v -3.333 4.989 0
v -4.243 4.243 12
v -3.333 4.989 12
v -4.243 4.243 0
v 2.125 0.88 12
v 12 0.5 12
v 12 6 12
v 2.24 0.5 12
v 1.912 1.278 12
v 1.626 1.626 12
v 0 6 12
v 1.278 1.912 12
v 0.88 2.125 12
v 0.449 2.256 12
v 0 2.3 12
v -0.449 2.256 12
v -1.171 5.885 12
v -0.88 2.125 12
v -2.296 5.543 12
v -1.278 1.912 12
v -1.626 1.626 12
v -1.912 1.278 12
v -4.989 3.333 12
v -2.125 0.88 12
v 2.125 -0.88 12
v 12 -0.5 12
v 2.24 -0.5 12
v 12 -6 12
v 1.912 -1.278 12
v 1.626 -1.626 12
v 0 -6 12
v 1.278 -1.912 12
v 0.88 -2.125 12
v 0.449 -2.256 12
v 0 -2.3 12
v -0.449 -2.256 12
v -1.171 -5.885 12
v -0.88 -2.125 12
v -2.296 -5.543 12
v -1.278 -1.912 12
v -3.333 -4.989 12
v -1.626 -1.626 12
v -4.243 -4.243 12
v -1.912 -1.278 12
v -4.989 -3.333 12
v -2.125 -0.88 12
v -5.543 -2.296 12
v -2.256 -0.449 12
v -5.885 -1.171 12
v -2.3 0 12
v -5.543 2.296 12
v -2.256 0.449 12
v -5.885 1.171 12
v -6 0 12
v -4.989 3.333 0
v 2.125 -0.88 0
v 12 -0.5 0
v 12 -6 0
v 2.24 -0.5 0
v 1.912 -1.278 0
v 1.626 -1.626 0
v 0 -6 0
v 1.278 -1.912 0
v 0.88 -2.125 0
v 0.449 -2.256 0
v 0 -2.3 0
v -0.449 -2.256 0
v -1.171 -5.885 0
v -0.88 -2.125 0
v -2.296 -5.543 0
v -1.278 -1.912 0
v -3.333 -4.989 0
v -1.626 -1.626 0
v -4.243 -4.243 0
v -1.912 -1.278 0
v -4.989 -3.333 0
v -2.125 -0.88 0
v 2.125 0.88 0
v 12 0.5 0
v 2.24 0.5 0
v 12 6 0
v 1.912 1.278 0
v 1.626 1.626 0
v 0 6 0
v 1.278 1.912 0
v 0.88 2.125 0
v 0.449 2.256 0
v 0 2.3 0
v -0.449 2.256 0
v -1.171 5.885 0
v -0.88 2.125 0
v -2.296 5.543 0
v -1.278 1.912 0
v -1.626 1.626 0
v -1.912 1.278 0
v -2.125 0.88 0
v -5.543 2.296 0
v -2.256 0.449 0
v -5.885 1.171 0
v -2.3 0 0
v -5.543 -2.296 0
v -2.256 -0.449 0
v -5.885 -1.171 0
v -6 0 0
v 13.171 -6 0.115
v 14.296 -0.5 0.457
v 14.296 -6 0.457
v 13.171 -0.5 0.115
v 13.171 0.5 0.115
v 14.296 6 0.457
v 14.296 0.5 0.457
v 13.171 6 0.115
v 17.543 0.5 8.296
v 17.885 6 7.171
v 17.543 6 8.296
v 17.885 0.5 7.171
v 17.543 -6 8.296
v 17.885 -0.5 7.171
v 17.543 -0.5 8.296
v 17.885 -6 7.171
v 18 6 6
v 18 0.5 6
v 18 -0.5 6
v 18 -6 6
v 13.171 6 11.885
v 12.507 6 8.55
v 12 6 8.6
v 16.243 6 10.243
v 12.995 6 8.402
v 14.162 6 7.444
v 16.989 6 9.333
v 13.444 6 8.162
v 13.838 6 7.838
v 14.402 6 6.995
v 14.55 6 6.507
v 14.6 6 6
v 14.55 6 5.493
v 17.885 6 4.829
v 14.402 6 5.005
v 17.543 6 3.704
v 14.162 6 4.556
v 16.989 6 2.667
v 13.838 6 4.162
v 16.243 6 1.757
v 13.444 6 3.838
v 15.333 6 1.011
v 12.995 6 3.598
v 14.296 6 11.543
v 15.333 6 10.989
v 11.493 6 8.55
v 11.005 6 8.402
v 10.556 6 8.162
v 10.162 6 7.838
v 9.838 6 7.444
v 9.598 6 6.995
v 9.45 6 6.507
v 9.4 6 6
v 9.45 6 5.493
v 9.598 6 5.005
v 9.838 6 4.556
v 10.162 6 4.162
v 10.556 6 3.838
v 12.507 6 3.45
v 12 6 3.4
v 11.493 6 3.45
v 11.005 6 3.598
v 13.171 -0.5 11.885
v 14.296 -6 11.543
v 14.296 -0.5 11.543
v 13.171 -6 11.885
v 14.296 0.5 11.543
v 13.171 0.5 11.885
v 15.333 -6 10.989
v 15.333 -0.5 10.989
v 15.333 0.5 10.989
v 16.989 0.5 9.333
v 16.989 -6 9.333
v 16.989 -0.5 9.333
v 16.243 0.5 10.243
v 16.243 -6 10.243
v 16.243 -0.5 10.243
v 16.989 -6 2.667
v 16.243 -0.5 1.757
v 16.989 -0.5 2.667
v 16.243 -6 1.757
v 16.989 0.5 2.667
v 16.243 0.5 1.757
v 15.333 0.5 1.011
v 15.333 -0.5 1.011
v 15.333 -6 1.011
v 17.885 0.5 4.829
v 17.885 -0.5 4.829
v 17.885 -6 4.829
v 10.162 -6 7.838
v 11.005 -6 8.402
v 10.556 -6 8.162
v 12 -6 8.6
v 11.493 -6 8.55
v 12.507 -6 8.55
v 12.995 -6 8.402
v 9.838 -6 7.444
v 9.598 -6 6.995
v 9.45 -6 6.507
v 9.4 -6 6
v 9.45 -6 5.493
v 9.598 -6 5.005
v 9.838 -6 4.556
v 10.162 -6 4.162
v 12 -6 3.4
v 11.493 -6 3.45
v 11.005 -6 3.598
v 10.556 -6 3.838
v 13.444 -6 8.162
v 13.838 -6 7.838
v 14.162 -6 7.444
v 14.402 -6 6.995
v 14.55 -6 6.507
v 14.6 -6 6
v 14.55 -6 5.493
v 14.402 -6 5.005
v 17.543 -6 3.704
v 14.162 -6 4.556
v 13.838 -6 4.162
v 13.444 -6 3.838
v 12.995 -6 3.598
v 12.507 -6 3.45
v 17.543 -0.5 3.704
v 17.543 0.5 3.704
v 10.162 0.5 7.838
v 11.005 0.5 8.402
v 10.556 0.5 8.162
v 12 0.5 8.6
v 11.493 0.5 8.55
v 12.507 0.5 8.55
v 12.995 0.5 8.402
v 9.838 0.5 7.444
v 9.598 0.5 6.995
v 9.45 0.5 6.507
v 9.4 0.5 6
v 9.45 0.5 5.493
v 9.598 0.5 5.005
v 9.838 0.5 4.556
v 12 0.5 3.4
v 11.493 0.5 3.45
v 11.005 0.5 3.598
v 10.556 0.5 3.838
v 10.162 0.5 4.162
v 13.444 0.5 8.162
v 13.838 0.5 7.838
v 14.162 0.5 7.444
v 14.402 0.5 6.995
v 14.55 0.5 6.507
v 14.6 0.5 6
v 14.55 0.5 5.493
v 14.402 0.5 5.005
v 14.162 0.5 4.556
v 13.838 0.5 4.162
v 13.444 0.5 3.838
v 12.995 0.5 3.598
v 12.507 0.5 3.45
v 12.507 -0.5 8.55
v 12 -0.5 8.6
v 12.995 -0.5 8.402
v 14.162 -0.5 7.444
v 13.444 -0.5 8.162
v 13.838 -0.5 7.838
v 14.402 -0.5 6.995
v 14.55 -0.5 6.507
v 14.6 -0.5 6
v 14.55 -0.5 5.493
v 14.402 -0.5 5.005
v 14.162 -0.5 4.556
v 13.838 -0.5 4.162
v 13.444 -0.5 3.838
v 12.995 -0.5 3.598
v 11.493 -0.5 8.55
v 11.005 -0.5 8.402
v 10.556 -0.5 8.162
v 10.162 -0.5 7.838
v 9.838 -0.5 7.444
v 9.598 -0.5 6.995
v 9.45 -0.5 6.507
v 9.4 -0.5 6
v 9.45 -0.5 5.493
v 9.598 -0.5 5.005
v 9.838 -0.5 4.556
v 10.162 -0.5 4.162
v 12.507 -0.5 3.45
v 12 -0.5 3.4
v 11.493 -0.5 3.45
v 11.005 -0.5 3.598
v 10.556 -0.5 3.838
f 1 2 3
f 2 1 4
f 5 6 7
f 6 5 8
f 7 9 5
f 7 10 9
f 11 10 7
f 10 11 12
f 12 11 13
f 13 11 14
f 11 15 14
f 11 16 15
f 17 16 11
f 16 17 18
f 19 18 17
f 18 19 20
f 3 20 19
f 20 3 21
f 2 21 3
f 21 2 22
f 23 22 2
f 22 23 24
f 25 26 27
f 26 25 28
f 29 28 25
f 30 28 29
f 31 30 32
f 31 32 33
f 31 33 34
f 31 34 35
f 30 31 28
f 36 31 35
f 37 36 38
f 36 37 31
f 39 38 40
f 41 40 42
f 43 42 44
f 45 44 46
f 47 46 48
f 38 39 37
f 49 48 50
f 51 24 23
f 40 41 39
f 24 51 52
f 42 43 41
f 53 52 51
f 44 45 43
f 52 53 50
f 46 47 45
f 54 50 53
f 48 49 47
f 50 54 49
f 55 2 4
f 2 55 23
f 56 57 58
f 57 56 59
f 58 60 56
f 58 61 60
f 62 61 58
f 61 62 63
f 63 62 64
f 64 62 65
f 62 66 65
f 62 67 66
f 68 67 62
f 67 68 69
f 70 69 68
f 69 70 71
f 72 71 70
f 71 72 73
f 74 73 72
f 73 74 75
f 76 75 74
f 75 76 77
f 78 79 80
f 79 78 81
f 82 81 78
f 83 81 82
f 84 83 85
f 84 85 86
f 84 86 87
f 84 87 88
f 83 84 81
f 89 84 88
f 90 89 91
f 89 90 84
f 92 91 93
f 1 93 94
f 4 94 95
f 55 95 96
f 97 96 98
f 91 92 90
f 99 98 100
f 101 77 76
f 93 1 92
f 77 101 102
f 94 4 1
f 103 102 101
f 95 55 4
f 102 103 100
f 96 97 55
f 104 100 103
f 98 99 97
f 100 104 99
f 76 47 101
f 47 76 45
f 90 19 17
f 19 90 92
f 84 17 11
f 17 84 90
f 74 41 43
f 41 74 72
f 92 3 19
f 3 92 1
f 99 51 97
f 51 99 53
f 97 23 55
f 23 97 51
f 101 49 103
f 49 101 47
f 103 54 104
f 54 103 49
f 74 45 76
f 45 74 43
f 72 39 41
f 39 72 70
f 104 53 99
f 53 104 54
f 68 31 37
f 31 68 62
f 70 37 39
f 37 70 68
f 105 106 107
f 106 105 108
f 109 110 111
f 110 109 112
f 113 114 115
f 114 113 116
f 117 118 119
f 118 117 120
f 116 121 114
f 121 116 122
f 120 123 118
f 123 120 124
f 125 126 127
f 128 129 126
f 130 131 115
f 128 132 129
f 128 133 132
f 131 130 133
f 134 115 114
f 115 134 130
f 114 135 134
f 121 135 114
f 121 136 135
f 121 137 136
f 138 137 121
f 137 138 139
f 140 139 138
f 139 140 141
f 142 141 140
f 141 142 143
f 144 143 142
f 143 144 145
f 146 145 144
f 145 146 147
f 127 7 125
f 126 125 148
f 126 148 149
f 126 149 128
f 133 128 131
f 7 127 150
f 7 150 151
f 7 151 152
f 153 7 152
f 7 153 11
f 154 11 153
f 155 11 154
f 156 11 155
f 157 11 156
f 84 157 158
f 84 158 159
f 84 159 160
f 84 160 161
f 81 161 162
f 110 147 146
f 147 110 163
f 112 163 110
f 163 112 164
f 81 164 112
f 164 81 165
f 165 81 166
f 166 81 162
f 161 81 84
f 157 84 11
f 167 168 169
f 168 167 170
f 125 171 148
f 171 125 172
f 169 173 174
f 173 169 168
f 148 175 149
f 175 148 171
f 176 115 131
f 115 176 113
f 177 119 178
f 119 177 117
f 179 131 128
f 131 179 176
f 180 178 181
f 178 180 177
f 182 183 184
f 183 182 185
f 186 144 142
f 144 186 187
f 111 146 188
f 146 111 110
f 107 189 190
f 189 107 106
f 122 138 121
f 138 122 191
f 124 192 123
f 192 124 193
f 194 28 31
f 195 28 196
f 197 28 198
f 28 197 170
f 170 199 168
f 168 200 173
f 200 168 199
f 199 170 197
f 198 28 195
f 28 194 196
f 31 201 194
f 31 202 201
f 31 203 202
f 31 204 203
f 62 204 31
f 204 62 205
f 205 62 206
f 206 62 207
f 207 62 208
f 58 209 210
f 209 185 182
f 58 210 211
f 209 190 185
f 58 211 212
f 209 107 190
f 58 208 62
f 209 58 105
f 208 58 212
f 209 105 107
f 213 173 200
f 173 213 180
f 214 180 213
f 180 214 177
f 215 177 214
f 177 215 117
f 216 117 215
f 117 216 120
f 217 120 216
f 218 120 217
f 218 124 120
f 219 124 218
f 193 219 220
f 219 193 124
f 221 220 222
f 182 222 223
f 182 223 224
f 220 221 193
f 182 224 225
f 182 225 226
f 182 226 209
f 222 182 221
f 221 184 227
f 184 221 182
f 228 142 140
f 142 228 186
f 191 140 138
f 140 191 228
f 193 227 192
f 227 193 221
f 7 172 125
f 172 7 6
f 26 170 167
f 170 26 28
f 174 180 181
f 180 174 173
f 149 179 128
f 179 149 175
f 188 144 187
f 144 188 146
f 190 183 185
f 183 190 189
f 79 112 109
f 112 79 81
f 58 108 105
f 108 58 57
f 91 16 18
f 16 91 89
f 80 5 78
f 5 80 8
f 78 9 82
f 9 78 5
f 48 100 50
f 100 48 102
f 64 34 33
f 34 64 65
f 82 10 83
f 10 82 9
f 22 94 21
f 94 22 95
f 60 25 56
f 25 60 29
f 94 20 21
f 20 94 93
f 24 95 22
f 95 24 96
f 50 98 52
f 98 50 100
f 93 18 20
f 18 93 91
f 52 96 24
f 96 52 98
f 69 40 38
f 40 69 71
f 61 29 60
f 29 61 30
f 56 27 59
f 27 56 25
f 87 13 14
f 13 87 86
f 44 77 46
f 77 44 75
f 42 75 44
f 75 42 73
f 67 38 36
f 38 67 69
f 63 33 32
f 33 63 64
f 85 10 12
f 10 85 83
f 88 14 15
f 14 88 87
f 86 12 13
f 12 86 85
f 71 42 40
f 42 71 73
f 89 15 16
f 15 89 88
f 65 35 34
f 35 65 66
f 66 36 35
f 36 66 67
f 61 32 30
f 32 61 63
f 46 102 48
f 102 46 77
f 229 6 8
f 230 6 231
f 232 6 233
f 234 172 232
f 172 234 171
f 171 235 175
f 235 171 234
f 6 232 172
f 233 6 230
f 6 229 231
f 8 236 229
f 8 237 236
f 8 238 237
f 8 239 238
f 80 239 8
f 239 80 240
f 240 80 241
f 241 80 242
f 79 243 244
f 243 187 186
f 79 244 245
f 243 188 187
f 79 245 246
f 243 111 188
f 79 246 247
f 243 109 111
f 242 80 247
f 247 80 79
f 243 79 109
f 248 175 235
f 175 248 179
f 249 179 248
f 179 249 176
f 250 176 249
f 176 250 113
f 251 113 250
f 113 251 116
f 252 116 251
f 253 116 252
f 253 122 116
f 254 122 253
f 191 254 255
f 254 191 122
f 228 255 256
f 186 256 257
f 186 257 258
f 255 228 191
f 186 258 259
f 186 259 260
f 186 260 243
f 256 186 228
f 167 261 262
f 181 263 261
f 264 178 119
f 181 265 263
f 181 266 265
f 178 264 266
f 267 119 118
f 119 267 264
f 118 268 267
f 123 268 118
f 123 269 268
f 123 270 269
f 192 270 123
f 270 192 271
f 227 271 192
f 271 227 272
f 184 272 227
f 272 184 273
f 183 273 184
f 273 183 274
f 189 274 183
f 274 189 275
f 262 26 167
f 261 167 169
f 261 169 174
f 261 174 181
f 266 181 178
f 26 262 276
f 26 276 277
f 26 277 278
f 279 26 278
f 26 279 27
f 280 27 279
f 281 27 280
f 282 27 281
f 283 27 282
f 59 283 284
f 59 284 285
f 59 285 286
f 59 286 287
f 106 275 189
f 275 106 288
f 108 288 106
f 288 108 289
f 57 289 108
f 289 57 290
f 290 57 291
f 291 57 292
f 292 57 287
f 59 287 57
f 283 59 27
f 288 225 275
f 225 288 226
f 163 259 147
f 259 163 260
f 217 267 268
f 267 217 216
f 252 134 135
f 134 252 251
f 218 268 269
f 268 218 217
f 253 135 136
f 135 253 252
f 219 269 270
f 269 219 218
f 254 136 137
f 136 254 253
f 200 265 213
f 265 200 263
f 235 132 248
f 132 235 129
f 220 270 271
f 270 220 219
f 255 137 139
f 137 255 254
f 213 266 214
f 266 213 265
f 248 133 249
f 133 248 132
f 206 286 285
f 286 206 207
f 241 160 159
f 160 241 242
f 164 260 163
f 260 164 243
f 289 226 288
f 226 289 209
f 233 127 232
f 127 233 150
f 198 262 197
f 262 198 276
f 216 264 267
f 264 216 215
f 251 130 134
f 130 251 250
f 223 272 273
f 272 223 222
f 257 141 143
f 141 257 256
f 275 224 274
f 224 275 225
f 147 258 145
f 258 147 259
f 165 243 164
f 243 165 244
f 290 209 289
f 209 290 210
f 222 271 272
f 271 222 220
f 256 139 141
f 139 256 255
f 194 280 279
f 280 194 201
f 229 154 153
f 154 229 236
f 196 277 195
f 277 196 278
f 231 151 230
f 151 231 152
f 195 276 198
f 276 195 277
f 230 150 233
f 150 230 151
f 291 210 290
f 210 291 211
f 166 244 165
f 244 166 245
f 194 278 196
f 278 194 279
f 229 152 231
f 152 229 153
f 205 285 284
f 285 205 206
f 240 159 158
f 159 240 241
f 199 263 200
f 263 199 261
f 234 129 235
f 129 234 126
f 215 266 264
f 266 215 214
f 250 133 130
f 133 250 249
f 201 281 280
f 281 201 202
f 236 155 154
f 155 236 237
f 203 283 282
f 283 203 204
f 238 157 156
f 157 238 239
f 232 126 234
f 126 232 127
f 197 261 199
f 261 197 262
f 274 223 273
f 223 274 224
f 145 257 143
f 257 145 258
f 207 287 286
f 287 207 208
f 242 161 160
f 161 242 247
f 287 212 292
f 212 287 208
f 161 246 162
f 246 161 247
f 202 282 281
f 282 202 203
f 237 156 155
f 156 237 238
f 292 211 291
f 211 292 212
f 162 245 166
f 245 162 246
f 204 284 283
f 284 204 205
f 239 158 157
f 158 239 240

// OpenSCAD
$fn=32;

main_size=12;
crack_size=1;
rod_d=4.6;
screw_d=5.2;

difference() {
    union() {
        cylinder(h=main_size,d=main_size);
        translate([main_size,main_size/2,main_size/2])
            rotate([90,0,0])
                cylinder(h=main_size,d=main_size);
        translate([0,-main_size/2,0])
            cube(main_size);
    }
    translate([0,0,-1])
        cylinder(h=main_size*2,d=rod_d);
    translate([main_size*1.5,0,0])
        cube([main_size*3,crack_size,main_size*3],center=true);
    translate([main_size,0,main_size/2])
        rotate([90,0,0])
            cylinder(h=main_size*2,d=screw_d,center=true);
}
